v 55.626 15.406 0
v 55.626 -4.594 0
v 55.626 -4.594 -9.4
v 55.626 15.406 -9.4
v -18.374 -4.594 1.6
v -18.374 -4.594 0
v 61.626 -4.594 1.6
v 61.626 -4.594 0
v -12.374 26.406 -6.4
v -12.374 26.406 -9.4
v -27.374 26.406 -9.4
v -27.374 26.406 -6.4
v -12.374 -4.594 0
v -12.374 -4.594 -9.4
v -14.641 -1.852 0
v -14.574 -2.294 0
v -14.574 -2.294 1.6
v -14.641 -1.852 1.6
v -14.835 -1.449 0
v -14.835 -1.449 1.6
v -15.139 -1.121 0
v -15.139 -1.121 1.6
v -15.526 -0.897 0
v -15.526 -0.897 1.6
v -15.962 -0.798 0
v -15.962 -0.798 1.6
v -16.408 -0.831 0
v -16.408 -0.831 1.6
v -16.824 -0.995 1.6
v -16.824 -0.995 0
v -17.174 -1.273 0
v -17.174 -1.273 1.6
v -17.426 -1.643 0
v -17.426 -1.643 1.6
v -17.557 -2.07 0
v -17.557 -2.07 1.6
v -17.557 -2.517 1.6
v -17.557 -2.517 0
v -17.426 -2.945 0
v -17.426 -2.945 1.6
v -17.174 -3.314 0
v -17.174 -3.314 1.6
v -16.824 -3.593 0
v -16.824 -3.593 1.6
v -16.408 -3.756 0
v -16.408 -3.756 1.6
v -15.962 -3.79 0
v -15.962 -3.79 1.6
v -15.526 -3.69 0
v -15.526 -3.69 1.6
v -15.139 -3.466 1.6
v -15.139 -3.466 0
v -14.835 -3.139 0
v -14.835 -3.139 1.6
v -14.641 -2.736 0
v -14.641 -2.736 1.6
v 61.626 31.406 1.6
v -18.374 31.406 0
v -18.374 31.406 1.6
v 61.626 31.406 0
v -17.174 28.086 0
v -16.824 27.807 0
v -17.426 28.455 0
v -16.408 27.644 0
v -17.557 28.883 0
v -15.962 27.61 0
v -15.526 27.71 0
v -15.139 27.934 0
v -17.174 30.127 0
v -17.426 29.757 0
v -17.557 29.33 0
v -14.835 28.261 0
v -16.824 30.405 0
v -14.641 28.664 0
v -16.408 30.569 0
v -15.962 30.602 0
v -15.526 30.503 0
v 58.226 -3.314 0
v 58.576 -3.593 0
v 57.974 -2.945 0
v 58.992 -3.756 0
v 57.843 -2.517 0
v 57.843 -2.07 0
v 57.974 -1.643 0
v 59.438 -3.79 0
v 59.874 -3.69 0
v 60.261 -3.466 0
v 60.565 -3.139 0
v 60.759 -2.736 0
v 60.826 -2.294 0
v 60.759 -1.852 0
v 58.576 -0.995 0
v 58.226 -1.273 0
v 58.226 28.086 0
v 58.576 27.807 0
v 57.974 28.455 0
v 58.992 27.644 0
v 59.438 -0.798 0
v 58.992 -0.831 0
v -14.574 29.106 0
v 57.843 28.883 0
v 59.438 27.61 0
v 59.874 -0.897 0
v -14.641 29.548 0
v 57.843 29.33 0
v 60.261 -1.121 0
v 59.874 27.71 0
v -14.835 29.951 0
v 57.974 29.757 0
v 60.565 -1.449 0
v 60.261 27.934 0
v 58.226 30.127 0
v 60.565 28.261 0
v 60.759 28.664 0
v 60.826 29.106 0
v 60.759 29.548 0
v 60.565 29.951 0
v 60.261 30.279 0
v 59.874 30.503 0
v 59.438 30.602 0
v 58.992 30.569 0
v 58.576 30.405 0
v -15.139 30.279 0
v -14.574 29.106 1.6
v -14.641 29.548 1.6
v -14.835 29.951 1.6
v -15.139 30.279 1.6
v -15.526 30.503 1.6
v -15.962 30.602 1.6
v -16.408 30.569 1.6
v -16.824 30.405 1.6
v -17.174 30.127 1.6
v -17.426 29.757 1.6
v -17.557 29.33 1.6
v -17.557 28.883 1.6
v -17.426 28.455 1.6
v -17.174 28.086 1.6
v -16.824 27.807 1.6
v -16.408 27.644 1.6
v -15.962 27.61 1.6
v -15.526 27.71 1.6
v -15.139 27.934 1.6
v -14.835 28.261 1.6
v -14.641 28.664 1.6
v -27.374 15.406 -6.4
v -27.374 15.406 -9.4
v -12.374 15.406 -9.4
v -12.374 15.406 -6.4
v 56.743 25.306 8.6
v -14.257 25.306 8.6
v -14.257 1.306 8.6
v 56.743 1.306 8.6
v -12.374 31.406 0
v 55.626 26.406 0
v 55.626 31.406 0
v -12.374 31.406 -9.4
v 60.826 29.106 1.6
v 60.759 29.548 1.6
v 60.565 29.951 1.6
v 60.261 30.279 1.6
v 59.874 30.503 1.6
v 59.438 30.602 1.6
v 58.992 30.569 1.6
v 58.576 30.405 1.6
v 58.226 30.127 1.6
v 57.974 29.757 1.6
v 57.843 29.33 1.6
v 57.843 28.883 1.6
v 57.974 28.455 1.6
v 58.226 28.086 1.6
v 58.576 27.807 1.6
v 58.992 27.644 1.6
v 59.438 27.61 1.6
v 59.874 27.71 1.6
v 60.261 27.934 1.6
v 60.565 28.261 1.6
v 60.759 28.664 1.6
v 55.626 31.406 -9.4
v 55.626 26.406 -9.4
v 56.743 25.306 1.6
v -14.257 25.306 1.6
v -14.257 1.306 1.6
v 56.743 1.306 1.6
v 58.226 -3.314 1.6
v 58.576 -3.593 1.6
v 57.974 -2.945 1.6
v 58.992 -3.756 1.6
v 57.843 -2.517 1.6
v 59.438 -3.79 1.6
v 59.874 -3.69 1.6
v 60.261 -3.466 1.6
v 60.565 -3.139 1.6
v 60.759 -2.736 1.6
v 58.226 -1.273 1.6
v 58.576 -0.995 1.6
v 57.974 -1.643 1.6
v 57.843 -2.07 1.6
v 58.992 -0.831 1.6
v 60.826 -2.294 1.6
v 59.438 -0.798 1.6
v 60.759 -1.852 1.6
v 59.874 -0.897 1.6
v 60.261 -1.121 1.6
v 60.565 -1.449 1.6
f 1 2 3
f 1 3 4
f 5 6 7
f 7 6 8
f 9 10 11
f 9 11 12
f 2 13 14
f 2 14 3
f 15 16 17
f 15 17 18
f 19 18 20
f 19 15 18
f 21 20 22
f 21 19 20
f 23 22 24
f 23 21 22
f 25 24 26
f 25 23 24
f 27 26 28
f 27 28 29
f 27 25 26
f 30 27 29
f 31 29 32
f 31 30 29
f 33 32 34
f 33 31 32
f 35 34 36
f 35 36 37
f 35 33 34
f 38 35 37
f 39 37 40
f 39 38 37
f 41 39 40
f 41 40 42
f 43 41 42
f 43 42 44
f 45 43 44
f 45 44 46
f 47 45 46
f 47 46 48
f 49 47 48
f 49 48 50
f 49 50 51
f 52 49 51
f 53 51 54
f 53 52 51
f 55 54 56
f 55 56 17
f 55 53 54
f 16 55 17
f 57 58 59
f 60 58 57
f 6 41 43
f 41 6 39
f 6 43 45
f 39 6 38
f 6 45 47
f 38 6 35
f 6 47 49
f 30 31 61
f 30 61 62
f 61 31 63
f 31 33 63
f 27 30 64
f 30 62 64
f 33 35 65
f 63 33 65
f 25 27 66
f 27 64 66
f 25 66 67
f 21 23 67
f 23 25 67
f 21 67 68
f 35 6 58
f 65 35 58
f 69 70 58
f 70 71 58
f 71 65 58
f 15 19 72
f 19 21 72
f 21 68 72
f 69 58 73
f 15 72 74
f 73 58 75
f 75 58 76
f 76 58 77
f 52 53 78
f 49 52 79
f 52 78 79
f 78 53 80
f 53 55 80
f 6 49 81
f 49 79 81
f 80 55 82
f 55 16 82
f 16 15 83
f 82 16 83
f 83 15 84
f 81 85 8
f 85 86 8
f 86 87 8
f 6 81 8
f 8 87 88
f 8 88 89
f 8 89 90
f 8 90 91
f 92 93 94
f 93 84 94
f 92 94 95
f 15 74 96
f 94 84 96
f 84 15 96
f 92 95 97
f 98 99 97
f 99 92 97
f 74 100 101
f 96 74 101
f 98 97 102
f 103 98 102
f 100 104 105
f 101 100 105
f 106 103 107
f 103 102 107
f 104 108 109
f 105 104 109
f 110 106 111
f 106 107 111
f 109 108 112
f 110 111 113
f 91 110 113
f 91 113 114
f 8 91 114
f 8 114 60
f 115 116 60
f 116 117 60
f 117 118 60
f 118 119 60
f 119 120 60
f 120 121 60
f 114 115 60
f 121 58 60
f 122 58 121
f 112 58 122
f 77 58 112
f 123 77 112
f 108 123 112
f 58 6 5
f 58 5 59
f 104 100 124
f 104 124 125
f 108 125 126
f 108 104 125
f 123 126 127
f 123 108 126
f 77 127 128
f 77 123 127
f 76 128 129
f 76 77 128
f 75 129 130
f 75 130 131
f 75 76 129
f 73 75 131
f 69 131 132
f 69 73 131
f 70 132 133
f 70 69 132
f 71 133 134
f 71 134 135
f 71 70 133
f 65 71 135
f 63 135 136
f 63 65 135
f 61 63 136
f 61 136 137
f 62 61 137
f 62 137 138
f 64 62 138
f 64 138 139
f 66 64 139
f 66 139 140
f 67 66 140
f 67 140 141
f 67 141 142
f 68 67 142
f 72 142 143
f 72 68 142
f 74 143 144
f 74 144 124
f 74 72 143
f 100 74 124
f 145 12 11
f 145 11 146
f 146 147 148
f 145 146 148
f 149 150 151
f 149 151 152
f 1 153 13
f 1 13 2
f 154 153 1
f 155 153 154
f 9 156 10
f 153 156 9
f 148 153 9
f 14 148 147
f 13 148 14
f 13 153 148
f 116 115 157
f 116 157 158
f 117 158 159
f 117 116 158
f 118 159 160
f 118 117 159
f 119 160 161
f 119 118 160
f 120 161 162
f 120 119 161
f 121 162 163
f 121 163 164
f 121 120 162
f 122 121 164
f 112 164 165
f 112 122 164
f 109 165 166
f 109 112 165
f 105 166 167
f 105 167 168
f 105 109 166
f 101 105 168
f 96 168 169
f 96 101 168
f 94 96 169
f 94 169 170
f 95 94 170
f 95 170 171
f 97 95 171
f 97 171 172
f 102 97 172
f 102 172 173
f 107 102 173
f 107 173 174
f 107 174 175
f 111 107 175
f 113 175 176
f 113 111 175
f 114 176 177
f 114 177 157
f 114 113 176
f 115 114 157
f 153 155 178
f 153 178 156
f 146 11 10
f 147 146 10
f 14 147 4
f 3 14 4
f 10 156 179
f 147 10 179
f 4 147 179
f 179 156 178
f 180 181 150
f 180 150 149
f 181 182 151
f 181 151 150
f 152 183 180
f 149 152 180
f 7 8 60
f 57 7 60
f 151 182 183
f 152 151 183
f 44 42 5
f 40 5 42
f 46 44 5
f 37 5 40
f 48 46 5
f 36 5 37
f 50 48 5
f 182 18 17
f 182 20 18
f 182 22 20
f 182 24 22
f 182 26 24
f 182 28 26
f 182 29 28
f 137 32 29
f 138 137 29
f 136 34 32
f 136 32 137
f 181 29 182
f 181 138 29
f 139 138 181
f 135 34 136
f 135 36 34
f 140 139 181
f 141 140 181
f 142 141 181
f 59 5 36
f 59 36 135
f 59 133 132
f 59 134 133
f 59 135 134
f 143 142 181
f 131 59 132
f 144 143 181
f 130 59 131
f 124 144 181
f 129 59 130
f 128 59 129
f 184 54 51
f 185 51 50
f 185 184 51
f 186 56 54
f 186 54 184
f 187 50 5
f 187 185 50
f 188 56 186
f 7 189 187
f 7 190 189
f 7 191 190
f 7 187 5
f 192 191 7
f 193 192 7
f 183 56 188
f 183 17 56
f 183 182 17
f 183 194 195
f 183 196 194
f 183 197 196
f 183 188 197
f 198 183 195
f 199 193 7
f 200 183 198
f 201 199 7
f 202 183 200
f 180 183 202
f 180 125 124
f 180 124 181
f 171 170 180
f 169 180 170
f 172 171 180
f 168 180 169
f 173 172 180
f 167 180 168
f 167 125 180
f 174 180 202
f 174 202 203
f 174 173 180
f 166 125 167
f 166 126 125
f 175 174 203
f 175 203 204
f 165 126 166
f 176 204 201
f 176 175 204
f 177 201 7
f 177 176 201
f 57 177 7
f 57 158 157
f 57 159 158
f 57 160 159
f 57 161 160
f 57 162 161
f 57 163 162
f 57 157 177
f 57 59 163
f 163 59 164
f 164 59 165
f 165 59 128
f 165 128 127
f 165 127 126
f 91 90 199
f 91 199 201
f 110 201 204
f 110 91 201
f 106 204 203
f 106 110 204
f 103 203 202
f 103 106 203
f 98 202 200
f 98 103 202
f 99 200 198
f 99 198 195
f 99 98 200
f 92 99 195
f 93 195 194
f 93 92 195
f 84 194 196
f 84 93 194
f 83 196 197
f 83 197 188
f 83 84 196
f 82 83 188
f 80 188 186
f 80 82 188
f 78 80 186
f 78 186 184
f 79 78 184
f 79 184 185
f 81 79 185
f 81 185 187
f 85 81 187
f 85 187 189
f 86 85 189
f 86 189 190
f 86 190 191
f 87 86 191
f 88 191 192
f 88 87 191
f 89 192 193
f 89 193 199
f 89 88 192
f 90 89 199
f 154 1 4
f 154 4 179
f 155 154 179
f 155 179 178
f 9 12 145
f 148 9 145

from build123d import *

# Parameters (mm, degrees)
F0_W     = 71
F0_H     = 24
F1_DEPTH = 8.6
F0_W_2   = 80
F0_H_2   = 36
F0_R     = 1.5
F2_DEPTH = 1.6
F3_W     = 12.519065
F3_H     = 11
F4_DEPTH = 9.4
F5_W     = 11
F5_H     = 3
F6_DEPTH = 15


with BuildPart() as f1:
    # F0 (on Top) → F1 (new body)
    with BuildSketch(Plane.XY):
        with Locations((21.243287, 13.306251)):
            Rectangle(F0_W, F0_H)
    extrude(amount=F1_DEPTH)

    # F0 (on Top) → F2 (join)
    with BuildSketch(Plane.XY):
        with Locations((21.625949, 13.406251)):
            Rectangle(F0_W_2, F0_H_2)
        with Locations((-16.074051, -2.293749)):
            Circle(F0_R, mode=Mode.SUBTRACT)
        with Locations((21.243287, 13.306251)):
            Rectangle(F0_W, F0_H, mode=Mode.SUBTRACT)
        with Locations((59.325949, -2.293749)):
            Circle(F0_R, mode=Mode.SUBTRACT)
        with Locations((-16.074051, 29.106251)):
            Circle(F0_R, mode=Mode.SUBTRACT)
        with Locations((59.325949, 29.106251)):
            Circle(F0_R, mode=Mode.SUBTRACT)
    extrude(amount=F2_DEPTH)


with BuildPart() as f4:
    # F3 (on Top) → F4 (new body)
    with BuildSketch(Plane.XY):
        Polygon((43.106884, 26.406251), (55.625949, 26.406251), (55.625949, 31.406251), (-12.374051, 31.406251), (-12.374051, -4.593749), (55.625949, -4.593749), (55.625949, 15.406251), (43.106884, 15.406251), align=None)
        with Locations((49.366416, 20.906251)):
            Rectangle(F3_W, F3_H)
    extrude(amount=-F4_DEPTH)

    # F5 (on face) → F6 (join)
    with BuildSketch(Plane(origin=(-12.374051, 0, 0), x_dir=(0, -1, 0), z_dir=(-1, 0, 0))):
        with Locations((-20.906251, -7.9)):
            Rectangle(F5_W, F5_H)
    extrude(amount=F6_DEPTH)


solid = Compound([f1.part, f4.part])
